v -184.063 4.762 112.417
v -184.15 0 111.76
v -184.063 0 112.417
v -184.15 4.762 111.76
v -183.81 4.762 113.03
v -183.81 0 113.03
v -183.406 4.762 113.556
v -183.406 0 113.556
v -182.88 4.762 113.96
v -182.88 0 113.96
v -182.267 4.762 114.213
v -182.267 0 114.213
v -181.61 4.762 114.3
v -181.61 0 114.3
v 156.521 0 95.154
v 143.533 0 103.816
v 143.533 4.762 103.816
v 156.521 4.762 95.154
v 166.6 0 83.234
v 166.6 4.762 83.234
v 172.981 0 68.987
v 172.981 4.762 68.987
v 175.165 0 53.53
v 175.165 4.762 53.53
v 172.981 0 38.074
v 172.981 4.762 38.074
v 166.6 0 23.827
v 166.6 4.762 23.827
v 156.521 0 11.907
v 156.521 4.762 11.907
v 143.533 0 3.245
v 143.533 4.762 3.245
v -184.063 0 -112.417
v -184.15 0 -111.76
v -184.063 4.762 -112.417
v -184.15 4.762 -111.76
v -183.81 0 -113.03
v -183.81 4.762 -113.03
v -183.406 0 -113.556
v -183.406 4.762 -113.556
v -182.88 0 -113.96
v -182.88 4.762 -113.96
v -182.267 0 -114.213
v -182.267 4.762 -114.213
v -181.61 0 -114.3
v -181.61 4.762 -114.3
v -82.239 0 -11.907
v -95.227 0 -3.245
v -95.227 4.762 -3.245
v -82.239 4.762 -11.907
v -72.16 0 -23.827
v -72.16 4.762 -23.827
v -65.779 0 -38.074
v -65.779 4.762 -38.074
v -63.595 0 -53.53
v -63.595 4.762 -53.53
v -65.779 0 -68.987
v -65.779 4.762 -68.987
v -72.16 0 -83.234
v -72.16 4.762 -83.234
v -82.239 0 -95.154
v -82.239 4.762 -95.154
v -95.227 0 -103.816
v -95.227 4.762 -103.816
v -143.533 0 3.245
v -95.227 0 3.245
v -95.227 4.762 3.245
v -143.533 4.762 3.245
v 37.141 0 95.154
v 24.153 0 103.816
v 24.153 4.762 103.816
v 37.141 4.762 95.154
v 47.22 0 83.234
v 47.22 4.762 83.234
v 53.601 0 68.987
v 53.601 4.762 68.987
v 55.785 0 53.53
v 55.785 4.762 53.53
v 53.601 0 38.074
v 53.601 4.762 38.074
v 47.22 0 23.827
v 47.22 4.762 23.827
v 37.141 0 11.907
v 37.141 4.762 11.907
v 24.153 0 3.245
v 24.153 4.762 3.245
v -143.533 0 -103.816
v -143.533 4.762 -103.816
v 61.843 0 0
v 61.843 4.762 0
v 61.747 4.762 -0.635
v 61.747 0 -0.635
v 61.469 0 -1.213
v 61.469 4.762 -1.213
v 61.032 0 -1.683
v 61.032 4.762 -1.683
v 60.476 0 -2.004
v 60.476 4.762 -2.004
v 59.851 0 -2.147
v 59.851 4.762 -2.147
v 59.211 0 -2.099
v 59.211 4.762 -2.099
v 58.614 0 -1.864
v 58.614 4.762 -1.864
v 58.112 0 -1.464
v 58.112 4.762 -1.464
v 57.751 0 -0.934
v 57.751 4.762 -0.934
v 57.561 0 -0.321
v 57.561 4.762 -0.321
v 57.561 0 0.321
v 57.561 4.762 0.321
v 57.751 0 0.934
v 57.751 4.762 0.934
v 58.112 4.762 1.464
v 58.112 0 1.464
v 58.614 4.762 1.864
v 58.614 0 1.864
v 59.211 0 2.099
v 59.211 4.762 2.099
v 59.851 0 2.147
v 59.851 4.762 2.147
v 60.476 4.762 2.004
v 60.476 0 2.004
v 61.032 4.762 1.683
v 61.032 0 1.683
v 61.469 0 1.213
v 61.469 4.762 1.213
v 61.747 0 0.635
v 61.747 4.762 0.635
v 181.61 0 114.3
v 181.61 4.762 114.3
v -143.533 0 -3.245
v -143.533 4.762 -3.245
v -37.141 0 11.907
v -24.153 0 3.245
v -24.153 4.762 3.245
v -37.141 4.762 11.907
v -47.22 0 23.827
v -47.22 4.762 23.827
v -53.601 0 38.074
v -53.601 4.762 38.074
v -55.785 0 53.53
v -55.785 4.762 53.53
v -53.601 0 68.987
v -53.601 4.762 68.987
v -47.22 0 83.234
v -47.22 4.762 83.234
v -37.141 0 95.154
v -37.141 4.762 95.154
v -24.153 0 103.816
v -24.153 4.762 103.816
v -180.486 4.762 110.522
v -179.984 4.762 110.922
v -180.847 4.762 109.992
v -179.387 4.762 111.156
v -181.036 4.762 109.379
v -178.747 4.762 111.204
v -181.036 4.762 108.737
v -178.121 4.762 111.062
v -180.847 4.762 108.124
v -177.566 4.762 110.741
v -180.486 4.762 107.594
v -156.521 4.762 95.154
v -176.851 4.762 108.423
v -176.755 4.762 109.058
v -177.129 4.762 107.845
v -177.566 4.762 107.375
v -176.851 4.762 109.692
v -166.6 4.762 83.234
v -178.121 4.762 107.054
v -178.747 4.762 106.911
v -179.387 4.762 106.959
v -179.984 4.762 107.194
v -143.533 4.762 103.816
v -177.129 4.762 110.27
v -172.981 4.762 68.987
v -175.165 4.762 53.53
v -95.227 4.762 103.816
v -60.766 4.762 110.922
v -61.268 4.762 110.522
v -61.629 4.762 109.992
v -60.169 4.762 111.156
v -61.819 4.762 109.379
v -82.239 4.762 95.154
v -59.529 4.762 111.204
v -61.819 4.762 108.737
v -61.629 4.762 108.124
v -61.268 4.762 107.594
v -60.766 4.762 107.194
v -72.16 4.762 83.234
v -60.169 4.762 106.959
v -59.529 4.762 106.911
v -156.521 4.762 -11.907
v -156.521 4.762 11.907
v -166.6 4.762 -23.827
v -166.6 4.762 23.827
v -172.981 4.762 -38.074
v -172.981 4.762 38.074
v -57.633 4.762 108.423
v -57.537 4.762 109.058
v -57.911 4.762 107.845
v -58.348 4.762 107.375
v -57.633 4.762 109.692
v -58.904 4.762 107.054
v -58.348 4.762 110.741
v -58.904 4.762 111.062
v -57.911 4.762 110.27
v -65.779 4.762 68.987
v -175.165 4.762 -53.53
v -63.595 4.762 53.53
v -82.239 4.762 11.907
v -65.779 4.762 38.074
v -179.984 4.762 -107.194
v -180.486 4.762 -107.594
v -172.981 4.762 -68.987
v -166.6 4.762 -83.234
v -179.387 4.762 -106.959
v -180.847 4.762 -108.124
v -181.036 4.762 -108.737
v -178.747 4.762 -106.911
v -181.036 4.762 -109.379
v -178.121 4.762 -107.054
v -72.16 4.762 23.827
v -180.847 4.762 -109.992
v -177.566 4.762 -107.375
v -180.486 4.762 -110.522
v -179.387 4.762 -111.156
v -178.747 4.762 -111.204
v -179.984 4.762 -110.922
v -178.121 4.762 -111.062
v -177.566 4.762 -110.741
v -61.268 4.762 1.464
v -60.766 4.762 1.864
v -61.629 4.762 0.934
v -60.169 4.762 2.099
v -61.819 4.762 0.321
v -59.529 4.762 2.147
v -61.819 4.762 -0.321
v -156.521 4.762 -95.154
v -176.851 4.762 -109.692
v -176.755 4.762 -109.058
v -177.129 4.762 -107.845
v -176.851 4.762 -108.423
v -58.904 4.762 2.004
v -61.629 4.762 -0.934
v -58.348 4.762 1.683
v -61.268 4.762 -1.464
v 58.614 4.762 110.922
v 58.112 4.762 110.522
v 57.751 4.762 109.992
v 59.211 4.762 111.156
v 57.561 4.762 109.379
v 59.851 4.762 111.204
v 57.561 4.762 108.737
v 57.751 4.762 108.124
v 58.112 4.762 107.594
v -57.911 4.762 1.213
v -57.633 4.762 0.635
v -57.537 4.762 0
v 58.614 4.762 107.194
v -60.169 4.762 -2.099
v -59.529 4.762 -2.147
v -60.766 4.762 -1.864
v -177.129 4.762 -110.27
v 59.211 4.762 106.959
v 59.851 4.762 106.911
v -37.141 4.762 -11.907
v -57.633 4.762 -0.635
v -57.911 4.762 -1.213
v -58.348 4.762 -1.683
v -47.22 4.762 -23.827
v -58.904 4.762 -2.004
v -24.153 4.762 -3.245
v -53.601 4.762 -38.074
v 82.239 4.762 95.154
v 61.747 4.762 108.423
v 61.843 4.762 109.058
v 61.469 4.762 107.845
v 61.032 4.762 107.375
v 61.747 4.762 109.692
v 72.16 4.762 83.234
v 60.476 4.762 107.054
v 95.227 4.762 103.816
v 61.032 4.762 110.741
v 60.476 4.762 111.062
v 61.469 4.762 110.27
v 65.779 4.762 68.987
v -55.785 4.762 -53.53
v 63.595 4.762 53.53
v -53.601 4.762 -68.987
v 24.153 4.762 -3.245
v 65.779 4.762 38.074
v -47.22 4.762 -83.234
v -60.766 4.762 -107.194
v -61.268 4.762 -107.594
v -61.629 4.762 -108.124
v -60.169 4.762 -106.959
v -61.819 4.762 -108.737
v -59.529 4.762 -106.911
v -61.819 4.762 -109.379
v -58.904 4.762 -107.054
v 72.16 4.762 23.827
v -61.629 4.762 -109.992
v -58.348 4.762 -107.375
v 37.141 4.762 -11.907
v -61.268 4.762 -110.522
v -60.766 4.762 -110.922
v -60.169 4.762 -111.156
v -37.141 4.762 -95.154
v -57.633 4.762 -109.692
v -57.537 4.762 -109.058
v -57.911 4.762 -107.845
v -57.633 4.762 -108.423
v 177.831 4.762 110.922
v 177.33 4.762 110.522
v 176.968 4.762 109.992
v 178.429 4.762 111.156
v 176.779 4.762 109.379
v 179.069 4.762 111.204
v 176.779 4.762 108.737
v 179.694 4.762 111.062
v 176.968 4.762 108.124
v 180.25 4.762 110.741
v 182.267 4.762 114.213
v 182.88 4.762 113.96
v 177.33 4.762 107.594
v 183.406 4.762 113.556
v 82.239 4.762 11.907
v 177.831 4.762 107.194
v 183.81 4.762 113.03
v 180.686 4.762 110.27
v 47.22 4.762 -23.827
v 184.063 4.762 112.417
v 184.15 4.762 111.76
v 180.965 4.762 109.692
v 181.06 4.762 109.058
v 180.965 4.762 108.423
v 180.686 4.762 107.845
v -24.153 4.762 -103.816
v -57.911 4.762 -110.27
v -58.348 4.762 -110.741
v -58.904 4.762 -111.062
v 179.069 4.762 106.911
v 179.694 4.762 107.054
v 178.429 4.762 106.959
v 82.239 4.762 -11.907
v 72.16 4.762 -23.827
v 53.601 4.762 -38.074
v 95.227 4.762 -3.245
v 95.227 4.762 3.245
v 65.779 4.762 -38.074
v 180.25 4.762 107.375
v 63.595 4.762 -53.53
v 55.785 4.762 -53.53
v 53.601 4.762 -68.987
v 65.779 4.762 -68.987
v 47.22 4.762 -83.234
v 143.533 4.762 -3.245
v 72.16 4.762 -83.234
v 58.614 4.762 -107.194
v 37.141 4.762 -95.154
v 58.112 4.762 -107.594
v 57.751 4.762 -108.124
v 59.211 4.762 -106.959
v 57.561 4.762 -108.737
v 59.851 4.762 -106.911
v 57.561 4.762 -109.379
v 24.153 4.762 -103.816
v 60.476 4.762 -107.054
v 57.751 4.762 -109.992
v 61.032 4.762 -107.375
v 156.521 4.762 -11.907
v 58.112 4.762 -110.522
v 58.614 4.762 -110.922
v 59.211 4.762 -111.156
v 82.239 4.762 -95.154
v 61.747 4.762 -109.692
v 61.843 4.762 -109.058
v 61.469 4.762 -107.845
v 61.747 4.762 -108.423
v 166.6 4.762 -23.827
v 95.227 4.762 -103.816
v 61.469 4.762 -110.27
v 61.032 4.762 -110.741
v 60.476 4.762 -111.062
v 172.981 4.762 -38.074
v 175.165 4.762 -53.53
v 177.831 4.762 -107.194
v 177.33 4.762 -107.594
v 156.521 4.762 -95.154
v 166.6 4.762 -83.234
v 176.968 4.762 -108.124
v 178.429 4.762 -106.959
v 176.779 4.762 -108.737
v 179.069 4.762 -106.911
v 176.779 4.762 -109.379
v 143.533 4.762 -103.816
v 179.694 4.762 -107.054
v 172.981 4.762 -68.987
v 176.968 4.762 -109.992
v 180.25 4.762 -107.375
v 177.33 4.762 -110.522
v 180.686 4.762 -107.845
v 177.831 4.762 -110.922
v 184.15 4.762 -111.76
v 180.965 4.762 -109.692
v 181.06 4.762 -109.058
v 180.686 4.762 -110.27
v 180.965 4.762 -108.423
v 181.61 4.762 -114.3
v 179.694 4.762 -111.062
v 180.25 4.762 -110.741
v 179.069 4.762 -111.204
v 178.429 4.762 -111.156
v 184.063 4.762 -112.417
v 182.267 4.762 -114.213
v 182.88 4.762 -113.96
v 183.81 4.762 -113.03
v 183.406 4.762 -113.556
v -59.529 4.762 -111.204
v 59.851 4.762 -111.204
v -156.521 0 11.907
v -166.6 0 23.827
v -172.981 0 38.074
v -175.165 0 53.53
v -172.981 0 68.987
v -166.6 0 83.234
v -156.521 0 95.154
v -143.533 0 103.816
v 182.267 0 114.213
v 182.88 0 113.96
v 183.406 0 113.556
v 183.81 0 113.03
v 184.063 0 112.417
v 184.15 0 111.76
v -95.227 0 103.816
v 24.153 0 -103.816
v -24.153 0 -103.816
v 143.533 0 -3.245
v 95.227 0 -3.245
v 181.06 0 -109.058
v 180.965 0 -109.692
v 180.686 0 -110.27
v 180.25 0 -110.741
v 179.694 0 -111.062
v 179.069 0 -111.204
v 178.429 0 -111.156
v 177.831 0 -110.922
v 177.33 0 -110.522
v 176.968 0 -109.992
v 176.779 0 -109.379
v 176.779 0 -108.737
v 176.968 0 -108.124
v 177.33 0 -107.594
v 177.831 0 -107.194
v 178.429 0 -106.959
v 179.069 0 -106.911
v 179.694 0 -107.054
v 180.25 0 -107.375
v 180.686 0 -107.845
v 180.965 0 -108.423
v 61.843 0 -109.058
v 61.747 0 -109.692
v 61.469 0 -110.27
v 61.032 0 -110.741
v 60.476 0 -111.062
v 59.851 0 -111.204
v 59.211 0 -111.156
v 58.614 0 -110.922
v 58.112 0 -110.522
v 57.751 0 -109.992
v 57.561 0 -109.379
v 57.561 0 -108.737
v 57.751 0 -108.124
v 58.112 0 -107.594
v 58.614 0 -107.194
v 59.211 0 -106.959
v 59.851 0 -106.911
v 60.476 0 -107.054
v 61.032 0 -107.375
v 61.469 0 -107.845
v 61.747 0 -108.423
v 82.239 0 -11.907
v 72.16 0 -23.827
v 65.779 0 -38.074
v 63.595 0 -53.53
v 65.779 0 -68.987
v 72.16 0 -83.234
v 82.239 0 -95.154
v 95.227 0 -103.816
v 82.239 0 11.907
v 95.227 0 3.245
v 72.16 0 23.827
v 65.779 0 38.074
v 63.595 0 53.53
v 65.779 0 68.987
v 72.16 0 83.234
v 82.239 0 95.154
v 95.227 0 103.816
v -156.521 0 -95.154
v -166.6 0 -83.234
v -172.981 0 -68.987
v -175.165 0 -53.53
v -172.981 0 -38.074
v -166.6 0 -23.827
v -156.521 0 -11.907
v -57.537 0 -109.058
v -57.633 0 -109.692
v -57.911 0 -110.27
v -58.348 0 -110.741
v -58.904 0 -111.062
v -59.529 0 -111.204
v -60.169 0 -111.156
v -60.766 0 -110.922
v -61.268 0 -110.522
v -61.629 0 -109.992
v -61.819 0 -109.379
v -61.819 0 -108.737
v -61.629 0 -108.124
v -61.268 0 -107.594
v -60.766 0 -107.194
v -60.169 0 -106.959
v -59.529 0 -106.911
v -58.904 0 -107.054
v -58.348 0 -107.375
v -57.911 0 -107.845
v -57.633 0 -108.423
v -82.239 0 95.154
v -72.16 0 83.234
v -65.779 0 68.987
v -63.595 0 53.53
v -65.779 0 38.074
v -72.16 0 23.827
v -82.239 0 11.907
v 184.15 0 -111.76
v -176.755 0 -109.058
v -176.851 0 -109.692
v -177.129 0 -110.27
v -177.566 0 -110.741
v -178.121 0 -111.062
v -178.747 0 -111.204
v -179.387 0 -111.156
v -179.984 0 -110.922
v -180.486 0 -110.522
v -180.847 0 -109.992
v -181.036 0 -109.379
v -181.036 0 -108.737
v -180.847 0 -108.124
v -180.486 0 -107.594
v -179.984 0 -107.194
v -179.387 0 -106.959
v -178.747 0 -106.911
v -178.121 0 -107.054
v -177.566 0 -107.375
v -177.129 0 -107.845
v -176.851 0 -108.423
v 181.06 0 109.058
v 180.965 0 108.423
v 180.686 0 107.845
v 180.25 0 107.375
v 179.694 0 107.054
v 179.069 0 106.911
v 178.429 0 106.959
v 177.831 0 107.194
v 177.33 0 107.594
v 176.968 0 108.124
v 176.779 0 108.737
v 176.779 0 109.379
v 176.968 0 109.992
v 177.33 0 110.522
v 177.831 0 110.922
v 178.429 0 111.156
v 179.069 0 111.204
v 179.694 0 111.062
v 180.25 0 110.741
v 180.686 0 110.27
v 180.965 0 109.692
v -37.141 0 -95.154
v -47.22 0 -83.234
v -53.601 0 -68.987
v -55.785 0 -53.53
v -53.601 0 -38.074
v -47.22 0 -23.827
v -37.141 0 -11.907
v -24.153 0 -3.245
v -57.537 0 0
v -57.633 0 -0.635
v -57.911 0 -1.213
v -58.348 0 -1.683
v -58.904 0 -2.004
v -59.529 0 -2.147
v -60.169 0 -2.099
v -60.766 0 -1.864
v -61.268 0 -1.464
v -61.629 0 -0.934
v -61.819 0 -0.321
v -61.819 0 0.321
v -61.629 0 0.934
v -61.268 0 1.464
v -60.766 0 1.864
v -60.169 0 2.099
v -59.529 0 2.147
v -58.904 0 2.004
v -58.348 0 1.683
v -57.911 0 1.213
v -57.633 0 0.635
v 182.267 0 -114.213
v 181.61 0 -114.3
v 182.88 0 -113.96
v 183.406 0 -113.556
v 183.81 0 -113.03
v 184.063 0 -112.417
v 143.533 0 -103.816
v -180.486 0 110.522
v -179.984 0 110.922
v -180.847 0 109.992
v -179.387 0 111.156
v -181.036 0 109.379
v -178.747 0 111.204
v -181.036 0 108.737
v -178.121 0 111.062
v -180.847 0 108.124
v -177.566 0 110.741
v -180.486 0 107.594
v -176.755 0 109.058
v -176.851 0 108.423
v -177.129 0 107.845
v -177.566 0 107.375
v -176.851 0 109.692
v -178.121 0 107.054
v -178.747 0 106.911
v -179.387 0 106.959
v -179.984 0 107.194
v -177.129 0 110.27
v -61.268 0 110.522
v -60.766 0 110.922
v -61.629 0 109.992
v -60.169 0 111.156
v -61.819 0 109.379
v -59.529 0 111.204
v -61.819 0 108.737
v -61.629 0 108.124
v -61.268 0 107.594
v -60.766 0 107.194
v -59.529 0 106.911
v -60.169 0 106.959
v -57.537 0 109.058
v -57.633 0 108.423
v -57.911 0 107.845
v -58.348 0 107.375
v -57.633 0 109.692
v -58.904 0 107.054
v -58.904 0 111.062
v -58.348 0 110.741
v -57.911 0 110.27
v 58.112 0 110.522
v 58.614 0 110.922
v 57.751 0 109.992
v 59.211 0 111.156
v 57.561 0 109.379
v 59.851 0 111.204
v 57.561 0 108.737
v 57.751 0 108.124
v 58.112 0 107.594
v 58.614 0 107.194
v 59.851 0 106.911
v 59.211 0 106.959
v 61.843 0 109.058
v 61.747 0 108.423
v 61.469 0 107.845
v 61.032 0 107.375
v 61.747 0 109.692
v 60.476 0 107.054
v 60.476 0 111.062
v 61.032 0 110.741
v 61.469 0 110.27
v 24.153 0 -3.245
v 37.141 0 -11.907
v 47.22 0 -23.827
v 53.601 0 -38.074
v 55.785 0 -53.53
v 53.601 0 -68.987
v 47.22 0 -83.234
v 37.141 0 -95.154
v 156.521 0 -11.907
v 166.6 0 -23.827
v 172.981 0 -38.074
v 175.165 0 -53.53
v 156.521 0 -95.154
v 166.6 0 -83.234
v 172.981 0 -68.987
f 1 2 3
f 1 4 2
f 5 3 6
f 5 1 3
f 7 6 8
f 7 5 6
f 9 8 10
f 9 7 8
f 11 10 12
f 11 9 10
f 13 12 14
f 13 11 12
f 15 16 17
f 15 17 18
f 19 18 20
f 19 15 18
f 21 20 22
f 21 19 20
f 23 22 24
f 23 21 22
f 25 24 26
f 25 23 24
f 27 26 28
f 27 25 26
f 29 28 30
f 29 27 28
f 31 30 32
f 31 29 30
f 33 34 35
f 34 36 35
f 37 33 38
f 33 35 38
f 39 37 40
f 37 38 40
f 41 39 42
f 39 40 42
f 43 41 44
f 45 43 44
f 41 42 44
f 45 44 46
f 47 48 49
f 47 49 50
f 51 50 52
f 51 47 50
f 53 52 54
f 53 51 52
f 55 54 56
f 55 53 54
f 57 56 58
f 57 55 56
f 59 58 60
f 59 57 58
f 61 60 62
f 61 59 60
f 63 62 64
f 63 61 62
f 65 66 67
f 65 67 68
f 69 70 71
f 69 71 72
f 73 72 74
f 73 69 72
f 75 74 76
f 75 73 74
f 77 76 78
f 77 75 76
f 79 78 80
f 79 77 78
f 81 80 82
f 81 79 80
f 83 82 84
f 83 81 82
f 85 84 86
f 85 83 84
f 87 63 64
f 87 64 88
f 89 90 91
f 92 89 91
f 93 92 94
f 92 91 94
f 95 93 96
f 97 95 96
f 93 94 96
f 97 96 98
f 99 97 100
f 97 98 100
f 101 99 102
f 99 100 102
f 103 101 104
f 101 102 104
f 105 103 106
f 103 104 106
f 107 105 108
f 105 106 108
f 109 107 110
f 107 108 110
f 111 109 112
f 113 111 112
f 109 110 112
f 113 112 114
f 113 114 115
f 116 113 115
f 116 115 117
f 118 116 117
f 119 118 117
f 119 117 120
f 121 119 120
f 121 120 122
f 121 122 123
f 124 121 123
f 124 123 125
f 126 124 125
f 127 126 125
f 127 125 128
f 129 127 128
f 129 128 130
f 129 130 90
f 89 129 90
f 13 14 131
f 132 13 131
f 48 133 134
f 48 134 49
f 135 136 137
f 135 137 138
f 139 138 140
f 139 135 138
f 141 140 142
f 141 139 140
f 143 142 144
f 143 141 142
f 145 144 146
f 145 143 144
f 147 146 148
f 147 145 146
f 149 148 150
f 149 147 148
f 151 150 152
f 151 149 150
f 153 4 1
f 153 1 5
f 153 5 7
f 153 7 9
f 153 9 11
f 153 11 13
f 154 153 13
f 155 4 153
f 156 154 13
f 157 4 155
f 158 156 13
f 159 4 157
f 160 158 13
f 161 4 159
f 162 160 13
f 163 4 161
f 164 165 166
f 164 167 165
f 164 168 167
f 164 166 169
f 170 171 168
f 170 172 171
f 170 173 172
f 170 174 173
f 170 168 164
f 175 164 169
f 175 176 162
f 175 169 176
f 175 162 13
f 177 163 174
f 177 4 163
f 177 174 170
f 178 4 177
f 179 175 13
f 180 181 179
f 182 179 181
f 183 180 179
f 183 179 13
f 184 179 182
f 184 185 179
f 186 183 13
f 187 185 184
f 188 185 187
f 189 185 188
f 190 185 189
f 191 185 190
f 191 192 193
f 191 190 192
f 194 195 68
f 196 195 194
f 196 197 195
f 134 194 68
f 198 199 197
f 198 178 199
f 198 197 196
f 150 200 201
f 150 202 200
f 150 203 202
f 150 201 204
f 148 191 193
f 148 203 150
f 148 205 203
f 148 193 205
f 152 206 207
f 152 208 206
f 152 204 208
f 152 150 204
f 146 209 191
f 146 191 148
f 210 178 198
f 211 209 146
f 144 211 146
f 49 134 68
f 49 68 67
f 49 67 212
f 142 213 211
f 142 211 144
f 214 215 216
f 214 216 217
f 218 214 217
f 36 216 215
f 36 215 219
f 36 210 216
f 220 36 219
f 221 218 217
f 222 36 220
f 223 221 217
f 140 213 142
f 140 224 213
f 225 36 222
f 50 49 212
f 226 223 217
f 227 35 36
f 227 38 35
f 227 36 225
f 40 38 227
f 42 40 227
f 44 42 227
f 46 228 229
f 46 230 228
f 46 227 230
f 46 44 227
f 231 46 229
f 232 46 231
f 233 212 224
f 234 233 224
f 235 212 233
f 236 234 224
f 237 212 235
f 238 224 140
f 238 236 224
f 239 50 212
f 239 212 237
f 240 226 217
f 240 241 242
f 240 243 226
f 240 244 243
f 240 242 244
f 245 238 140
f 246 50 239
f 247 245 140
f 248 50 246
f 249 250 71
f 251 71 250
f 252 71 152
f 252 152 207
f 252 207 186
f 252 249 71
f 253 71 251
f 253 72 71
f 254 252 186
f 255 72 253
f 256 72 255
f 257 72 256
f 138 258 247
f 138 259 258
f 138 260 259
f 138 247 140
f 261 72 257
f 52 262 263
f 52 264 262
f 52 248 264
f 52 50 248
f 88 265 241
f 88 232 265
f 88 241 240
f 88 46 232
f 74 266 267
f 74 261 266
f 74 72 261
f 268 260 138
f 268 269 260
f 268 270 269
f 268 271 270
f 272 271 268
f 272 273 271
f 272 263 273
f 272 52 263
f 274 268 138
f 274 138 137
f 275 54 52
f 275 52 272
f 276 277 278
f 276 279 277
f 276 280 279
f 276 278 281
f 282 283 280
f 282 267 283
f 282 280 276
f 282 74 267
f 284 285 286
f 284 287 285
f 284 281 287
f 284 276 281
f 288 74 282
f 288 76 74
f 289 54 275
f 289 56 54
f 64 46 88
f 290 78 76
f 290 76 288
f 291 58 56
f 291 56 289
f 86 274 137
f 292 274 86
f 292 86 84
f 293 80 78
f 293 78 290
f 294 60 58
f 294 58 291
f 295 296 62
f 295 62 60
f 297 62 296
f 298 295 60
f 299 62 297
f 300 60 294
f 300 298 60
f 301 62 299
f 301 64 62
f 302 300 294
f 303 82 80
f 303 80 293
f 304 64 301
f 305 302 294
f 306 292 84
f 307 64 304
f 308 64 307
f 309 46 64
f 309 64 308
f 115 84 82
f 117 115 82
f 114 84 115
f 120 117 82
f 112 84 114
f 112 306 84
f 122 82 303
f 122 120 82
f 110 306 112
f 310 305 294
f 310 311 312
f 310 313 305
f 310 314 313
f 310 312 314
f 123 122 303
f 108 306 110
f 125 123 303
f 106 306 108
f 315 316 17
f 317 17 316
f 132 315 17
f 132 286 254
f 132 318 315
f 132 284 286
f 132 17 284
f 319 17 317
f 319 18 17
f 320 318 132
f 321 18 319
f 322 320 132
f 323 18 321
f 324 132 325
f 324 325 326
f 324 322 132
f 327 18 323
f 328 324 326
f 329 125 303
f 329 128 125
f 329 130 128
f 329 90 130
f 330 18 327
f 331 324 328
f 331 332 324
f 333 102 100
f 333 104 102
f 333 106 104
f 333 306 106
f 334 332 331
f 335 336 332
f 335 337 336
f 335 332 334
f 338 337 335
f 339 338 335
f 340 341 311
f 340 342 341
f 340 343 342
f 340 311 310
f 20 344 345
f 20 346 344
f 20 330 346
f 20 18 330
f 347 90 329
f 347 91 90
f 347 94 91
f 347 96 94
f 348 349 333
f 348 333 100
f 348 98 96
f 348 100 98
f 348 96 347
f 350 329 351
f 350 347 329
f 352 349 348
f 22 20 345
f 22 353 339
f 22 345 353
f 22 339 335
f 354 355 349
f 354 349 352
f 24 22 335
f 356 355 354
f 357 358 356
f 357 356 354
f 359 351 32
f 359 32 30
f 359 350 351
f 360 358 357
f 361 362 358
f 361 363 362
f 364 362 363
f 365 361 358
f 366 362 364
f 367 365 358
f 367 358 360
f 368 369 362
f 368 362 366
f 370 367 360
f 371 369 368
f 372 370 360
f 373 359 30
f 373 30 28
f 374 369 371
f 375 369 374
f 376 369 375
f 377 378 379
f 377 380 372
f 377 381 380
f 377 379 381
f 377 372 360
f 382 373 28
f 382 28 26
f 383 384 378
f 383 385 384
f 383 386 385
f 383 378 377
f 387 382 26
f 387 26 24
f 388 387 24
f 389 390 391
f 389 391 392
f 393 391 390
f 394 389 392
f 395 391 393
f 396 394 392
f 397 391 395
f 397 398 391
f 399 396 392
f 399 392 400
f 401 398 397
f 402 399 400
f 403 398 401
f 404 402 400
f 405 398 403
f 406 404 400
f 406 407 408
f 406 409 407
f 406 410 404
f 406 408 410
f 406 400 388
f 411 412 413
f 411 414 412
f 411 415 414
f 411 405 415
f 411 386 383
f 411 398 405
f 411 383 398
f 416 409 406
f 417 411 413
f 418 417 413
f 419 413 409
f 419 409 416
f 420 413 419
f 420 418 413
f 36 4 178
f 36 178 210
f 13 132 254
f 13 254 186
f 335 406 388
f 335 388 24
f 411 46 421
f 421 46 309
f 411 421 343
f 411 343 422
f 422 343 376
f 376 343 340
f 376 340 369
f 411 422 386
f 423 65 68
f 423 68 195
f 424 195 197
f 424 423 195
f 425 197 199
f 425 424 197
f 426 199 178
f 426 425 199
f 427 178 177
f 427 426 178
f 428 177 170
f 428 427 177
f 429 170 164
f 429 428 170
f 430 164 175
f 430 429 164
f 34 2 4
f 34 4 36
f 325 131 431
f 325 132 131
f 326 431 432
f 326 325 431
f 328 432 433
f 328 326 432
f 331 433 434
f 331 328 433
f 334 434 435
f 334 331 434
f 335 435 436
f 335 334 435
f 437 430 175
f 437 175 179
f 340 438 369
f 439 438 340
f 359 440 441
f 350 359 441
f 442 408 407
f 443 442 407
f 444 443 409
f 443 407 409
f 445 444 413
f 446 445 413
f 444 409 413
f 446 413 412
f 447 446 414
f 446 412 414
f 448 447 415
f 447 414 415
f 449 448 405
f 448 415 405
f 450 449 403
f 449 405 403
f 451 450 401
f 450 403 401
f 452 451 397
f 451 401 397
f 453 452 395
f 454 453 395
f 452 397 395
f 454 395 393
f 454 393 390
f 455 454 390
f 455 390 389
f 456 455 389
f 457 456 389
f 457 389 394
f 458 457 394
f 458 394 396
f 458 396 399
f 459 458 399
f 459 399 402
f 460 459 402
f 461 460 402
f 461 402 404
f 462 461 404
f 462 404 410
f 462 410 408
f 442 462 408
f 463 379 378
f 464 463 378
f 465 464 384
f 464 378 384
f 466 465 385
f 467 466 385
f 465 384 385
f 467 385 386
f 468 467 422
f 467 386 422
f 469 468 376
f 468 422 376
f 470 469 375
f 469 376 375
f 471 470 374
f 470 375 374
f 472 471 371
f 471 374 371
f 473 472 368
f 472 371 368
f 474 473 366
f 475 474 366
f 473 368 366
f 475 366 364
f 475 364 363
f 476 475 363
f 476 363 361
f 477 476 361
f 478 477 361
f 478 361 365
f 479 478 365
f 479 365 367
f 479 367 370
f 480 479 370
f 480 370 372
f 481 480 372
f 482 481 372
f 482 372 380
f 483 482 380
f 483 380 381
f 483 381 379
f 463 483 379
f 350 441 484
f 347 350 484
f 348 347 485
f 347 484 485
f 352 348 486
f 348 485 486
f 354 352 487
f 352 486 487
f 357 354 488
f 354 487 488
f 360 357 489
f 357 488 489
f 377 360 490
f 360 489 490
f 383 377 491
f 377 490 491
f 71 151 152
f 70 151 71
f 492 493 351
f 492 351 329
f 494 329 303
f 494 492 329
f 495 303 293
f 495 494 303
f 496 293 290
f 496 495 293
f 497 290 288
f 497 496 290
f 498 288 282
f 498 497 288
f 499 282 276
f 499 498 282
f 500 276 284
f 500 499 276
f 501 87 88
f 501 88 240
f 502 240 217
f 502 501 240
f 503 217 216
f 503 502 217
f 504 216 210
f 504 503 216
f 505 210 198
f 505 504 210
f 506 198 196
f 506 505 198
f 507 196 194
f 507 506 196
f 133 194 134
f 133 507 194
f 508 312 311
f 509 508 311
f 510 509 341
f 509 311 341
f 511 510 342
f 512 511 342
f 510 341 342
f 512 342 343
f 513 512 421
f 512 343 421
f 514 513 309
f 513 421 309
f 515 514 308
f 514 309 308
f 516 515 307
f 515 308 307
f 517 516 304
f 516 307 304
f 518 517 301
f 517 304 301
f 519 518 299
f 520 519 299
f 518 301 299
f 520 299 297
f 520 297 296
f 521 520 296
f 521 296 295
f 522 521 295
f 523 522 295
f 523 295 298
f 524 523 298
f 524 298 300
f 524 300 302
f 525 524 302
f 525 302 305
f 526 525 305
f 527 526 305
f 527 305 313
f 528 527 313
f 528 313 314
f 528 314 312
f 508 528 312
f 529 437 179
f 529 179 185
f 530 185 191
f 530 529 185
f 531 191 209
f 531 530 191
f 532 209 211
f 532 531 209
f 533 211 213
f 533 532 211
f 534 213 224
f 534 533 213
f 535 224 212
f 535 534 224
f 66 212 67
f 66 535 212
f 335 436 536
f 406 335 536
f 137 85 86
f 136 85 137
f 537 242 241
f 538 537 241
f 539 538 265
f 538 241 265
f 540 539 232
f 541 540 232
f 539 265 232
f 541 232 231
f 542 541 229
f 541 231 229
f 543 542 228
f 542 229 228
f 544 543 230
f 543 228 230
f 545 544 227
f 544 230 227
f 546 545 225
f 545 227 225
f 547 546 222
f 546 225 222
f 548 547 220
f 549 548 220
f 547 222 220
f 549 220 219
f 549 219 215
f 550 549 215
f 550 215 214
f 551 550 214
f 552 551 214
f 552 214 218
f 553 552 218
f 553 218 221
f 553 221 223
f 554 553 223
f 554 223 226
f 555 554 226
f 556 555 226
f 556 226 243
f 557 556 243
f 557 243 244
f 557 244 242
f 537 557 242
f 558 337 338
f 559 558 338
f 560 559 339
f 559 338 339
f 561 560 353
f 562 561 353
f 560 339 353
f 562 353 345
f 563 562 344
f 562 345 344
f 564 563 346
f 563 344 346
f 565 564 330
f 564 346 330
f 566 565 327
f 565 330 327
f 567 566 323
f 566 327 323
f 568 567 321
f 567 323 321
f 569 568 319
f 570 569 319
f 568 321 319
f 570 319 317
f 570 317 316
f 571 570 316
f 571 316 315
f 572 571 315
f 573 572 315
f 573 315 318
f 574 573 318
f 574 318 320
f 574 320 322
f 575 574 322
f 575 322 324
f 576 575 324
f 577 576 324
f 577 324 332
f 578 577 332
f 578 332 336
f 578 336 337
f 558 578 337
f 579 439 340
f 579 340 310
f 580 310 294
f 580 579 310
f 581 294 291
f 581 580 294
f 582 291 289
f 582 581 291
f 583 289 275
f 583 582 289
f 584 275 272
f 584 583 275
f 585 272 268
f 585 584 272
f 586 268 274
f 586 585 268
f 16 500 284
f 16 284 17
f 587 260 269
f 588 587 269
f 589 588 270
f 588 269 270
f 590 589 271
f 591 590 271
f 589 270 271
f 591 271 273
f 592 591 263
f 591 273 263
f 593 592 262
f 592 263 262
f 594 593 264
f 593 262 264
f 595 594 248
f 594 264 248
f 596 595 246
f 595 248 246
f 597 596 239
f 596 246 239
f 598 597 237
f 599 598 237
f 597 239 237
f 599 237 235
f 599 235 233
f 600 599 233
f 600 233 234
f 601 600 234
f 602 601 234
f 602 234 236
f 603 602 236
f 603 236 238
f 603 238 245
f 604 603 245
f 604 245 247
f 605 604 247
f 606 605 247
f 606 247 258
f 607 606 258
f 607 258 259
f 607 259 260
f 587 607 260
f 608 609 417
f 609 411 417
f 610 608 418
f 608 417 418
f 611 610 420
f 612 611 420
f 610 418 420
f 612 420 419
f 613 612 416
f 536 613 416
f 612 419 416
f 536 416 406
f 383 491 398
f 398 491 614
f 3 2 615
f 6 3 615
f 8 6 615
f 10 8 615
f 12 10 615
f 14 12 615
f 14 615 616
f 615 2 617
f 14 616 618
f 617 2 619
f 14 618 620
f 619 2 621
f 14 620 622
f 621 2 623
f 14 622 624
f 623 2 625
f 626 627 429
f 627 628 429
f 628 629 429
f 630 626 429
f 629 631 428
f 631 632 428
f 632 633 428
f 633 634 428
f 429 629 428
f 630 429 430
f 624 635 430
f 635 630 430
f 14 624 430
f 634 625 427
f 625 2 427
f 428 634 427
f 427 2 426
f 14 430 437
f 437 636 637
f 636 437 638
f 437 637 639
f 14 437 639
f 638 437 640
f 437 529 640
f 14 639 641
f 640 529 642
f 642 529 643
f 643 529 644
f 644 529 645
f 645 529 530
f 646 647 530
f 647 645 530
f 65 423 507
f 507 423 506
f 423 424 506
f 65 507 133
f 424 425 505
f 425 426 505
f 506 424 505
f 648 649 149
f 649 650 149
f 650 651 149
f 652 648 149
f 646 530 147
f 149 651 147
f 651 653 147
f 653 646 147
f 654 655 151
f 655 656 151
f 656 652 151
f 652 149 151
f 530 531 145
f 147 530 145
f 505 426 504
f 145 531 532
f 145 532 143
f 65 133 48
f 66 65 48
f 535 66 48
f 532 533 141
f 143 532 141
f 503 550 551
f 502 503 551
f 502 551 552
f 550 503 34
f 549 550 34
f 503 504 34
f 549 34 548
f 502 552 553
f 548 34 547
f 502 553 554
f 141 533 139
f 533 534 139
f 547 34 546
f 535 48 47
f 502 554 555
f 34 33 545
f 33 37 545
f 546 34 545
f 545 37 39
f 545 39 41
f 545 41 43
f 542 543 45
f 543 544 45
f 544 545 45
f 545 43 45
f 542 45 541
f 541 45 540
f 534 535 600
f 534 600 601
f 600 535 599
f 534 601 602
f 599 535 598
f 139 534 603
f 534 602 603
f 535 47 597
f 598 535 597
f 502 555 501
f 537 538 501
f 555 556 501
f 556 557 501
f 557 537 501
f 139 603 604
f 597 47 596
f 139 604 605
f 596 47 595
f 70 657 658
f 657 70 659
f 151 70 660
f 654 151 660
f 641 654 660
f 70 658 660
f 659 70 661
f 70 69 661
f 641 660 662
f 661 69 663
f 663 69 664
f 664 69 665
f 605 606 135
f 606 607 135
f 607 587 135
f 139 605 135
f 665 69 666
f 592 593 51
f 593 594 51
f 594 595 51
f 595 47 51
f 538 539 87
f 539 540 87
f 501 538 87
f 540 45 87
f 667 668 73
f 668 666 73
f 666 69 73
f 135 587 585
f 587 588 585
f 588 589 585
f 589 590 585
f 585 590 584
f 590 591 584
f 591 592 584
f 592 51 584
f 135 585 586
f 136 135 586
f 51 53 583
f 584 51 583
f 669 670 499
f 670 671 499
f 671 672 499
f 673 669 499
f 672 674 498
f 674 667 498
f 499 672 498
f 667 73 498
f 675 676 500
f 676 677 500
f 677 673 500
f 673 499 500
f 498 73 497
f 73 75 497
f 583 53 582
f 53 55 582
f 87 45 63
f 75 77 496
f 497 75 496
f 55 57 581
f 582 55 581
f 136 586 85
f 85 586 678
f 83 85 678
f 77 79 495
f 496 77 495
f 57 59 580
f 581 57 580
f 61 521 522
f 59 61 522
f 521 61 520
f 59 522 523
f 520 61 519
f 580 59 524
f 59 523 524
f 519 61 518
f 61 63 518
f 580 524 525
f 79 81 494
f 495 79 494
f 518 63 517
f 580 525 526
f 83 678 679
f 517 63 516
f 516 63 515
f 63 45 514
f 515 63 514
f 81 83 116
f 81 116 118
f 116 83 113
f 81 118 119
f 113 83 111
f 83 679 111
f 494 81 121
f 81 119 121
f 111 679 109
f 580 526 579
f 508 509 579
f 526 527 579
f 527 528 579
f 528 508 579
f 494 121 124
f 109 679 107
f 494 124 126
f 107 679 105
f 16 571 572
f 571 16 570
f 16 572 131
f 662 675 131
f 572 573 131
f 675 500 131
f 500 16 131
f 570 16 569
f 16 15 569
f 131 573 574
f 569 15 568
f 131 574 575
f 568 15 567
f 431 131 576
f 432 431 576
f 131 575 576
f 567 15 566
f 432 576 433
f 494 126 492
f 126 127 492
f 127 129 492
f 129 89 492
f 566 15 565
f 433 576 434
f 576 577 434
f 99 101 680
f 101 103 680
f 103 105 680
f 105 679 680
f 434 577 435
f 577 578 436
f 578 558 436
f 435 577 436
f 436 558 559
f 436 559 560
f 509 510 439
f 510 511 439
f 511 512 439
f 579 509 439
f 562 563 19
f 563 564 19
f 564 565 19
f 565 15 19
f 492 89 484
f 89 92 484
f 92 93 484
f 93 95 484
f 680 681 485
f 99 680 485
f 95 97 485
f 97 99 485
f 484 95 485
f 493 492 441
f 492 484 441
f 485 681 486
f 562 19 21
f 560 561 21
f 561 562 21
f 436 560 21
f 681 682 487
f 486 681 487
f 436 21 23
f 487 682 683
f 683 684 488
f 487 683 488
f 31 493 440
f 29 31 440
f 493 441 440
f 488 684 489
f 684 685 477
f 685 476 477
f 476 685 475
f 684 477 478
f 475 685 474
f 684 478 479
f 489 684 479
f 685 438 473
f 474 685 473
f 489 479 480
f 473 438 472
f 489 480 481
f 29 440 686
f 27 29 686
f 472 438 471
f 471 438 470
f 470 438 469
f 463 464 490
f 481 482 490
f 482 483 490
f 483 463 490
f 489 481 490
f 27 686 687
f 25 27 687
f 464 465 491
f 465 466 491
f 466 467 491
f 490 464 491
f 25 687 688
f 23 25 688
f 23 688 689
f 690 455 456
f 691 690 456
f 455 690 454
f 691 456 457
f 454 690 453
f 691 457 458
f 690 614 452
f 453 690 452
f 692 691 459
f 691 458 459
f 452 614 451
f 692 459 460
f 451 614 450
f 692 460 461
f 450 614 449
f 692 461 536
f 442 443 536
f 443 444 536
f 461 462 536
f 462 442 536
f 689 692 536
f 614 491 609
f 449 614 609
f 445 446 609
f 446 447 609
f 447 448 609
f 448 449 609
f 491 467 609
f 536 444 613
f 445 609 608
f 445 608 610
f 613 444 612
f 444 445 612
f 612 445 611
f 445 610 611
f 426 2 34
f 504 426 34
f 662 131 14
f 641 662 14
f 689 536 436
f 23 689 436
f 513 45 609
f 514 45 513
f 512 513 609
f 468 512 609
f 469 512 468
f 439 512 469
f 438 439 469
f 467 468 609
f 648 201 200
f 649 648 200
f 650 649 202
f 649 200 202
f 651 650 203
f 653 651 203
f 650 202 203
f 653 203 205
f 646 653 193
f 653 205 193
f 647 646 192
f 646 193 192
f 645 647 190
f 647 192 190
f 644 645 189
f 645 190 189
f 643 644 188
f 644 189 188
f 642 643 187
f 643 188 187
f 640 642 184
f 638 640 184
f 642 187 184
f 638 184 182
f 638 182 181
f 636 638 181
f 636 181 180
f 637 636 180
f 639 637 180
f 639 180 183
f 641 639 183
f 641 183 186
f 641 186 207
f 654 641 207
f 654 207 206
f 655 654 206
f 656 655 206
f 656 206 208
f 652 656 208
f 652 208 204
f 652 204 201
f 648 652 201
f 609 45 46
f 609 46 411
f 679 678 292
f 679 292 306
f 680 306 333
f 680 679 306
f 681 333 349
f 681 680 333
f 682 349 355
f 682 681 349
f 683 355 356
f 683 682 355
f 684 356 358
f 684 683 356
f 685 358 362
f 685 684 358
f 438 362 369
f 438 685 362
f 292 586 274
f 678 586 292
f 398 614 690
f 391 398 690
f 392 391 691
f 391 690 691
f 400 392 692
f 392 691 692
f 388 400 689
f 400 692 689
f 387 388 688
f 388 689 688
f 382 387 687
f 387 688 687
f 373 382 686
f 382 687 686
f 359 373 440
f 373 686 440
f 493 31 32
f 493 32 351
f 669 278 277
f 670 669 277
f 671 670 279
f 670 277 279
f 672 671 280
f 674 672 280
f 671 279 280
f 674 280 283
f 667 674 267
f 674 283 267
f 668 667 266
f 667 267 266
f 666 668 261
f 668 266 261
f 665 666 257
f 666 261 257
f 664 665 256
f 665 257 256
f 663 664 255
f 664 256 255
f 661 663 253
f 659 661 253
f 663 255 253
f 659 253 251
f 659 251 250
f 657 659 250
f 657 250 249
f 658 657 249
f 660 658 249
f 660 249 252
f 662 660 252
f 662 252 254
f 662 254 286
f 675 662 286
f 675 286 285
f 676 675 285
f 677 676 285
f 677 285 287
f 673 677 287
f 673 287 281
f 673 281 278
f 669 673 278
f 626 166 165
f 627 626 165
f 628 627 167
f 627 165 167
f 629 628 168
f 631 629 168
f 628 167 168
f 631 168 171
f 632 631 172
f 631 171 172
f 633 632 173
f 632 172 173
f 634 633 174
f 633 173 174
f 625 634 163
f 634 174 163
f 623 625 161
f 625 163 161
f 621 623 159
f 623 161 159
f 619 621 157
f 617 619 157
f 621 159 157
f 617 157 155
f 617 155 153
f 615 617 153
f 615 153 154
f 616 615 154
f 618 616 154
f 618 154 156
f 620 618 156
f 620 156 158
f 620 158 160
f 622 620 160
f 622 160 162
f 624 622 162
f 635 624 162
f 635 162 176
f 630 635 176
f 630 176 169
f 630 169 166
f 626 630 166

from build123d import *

# Parameters (mm, degrees)
SKETCH1_W             = 368.3
SKETCH1_H             = 228.6
BOSS_EXTRUDE1_DEPTH   = 4.7625
CUT_EXTRUDE1_DEPTH    = 217.791129676
SKETCH_PATTERN1_DEPTH = 4.7625
FILLET1_R             = 2.54
F_8_CLEARANCE_HOLE1_D = 4.3053


# Read off the part's stored shape, not the designer's step: Sketch-Pattern1
with BuildPart() as part:
    # Sketch1 → Boss-Extrude1 (new body)
    with BuildSketch(Plane(origin=(0, 0, 0), x_dir=(1, 0, 0), z_dir=(0, 1, 0))):
        Rectangle(SKETCH1_W, SKETCH1_H)
    extrude(amount=BOSS_EXTRUDE1_DEPTH)

    # Sketch3 → Cut-Extrude1 (cut, through all)
    with BuildSketch(Plane.XZ):
        with BuildLine():
            Line((143.533374481, -3.245454654), (95.226625519, -3.245454654))
            ThreePointArc((95.226625519, -3.245454654), (63.594954654, -53.5305), (95.226625519, -103.815545346))
            Line((95.226625519, -103.815545346), (143.533374481, -103.815545346))
            ThreePointArc((143.533374481, -103.815545346), (175.165045346, -53.5305), (143.533374481, -3.245454654))
        make_face()
    extrude(amount=-CUT_EXTRUDE1_DEPTH, mode=Mode.SUBTRACT)

    # Sketch-Pattern1 outline → Sketch-Pattern1 (cut)
    with BuildSketch(Plane(origin=(0, 0, 0), x_dir=(1, 0, 0), z_dir=(0, 1, 0))):
        with BuildLine():
            ThreePointArc((-24.153374481, 103.815545346), (-55.785045346, 53.5305), (-24.153374481, 3.245454654))
            Line((-24.153374481, 3.245454654), (24.153374481, 3.245454654))
            ThreePointArc((24.153374481, 3.245454654), (55.785045346, 53.5305), (24.153374481, 103.815545346))
            Line((24.153374481, 103.815545346), (-24.153374481, 103.815545346))
        make_face()
        with BuildLine():
            ThreePointArc((-143.533374481, 103.815545346), (-175.165045346, 53.5305), (-143.533374481, 3.245454654))
            Line((-143.533374481, 3.245454654), (-95.226625519, 3.245454654))
            ThreePointArc((-95.226625519, 3.245454654), (-63.594954654, 53.5305), (-95.226625519, 103.815545346))
            Line((-95.226625519, 103.815545346), (-143.533374481, 103.815545346))
        make_face()
        with BuildLine():
            ThreePointArc((95.226625519, -3.245454654), (63.594954654, -53.5305), (95.226625519, -103.815545346))
            Line((95.226625519, -103.815545346), (143.533374481, -103.815545346))
            ThreePointArc((143.533374481, -103.815545346), (175.165045346, -53.5305), (143.533374481, -3.245454654))
            Line((143.533374481, -3.245454654), (95.226625519, -3.245454654))
        make_face()
        with BuildLine():
            ThreePointArc((-24.153374481, -3.245454654), (-55.785045346, -53.5305), (-24.153374481, -103.815545346))
            Line((-24.153374481, -103.815545346), (24.153374481, -103.815545346))
            ThreePointArc((24.153374481, -103.815545346), (55.785045346, -53.5305), (24.153374481, -3.245454654))
            Line((24.153374481, -3.245454654), (-24.153374481, -3.245454654))
        make_face()
        with BuildLine():
            ThreePointArc((-143.533374481, -3.245454654), (-175.165045346, -53.5305), (-143.533374481, -103.815545346))
            Line((-143.533374481, -103.815545346), (-95.226625519, -103.815545346))
            ThreePointArc((-95.226625519, -103.815545346), (-63.594954654, -53.5305), (-95.226625519, -3.245454654))
            Line((-95.226625519, -3.245454654), (-143.533374481, -3.245454654))
        make_face()
    extrude(amount=SKETCH_PATTERN1_DEPTH, mode=Mode.SUBTRACT)

    # Fillet1
    fillet1_edges = [part.edges().sort_by_distance(p)[0] for p in [
        (184.15, 2.38125, 114.3),
        (-184.15, 2.38125, 114.3),
        (-184.15, 2.38125, -114.3),
        (184.15, 2.38125, -114.3),
    ]]
    fillet(fillet1_edges, radius=FILLET1_R)

    # #8 Clearance Hole1 (through all)
    with Locations(Plane(origin=(0, 0, 0), x_dir=(-1, 0, 0), z_dir=(0, -1, 0))):
        with Locations((-178.907772673, 109.057772673), (-59.69, 109.057772673), (59.69, 109.057772673), (178.907772673, 109.057772673), (178.907772673, -109.057772673), (59.69, -109.057772673), (-59.69, -109.057772673), (-178.907772673, -109.057772673), (59.69, 0), (-59.69, 0)):
            Hole(F_8_CLEARANCE_HOLE1_D / 2)


solid = part.part
